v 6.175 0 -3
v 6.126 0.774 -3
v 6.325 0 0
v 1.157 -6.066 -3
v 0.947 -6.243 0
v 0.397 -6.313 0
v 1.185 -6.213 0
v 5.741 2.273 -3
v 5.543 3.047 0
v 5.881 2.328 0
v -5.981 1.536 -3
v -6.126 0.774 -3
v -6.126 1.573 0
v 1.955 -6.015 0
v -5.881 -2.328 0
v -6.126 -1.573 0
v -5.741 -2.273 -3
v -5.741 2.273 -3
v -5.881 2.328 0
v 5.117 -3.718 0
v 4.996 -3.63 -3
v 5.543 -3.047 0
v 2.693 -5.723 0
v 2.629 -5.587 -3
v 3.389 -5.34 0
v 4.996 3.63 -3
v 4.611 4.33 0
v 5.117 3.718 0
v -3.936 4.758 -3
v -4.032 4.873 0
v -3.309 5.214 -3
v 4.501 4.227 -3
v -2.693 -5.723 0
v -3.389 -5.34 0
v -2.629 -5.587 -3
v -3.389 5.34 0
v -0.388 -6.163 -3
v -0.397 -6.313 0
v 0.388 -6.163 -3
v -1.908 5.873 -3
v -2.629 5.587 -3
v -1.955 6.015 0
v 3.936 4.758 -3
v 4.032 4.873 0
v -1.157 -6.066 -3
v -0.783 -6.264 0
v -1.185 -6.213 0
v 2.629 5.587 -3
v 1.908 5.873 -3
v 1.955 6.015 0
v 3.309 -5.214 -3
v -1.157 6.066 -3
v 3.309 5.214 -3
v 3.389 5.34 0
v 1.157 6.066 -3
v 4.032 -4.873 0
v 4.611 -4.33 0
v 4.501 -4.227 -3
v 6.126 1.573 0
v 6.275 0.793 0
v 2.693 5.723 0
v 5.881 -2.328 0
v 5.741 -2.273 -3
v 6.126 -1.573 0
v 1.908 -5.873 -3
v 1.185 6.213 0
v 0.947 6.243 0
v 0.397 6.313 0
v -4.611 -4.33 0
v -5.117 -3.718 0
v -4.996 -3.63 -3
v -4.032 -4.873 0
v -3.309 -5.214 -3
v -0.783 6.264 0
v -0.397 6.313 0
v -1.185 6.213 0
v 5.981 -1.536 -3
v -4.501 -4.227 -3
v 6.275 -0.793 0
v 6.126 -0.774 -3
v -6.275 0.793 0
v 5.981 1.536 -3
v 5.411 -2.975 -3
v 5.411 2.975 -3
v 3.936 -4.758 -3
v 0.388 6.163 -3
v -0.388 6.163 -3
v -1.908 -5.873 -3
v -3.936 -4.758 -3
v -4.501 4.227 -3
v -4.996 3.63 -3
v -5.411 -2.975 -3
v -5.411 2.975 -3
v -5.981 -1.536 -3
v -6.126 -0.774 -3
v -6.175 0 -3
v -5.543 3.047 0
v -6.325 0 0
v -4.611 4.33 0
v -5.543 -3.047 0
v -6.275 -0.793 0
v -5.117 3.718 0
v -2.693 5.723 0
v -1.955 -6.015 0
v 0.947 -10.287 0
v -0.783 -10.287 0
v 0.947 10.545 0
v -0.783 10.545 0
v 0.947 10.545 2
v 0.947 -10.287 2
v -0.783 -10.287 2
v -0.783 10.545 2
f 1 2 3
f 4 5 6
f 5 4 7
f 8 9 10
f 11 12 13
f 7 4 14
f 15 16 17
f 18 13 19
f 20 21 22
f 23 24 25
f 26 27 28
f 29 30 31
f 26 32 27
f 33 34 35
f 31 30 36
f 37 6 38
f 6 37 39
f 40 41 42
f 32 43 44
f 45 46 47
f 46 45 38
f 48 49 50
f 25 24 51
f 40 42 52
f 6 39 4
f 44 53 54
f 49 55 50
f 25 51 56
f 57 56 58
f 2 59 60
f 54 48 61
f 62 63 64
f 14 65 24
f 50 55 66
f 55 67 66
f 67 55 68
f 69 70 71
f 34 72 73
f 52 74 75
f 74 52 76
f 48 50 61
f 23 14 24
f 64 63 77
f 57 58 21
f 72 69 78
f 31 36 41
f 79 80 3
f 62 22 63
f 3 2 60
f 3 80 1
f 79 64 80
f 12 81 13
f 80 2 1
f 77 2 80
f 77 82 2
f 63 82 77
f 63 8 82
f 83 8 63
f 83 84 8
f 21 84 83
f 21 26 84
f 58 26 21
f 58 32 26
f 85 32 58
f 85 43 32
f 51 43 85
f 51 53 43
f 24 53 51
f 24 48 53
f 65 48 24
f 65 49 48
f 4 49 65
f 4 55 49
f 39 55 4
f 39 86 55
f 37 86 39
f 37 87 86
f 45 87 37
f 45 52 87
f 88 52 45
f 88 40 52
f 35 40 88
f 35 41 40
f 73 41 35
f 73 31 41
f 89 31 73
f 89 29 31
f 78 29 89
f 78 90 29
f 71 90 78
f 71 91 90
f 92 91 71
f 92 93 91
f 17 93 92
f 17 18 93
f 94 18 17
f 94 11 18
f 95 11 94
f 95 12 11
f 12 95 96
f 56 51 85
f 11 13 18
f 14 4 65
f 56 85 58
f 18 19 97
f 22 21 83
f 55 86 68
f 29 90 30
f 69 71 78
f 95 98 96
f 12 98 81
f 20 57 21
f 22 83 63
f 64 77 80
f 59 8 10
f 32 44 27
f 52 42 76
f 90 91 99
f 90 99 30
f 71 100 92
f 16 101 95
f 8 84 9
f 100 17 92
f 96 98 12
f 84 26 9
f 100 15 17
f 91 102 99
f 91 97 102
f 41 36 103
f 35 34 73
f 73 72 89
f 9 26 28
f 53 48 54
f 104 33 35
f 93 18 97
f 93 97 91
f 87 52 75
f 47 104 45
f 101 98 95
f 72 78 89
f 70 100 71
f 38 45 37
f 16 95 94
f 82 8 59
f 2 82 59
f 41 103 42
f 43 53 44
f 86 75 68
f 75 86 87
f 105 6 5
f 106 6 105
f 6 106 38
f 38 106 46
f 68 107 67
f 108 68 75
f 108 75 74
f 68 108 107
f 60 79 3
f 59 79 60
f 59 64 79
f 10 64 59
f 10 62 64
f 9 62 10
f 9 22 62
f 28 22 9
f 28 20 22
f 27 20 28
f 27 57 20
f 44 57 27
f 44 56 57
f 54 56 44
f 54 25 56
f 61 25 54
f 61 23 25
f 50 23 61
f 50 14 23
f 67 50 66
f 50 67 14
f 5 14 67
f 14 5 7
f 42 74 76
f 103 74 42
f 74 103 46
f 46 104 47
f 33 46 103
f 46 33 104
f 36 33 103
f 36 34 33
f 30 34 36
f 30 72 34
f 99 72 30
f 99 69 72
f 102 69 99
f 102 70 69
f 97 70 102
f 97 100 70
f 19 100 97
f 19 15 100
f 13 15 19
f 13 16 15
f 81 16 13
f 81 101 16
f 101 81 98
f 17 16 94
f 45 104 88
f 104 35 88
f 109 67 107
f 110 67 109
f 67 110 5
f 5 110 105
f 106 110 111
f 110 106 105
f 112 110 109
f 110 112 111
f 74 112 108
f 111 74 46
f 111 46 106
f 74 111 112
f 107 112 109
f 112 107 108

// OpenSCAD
$fn = 50;

difference() {
	union() {
		translate(v = [0, 0, -3.0]) {
			cylinder(h = 3, r1 = 6.175, r2 = 6.325);
		}
		linear_extrude(height = 2) {
			text(font = "Wingdings", halign = "center", size = 15, text = "|", valign = "center");
		}
	}
	union();
}
